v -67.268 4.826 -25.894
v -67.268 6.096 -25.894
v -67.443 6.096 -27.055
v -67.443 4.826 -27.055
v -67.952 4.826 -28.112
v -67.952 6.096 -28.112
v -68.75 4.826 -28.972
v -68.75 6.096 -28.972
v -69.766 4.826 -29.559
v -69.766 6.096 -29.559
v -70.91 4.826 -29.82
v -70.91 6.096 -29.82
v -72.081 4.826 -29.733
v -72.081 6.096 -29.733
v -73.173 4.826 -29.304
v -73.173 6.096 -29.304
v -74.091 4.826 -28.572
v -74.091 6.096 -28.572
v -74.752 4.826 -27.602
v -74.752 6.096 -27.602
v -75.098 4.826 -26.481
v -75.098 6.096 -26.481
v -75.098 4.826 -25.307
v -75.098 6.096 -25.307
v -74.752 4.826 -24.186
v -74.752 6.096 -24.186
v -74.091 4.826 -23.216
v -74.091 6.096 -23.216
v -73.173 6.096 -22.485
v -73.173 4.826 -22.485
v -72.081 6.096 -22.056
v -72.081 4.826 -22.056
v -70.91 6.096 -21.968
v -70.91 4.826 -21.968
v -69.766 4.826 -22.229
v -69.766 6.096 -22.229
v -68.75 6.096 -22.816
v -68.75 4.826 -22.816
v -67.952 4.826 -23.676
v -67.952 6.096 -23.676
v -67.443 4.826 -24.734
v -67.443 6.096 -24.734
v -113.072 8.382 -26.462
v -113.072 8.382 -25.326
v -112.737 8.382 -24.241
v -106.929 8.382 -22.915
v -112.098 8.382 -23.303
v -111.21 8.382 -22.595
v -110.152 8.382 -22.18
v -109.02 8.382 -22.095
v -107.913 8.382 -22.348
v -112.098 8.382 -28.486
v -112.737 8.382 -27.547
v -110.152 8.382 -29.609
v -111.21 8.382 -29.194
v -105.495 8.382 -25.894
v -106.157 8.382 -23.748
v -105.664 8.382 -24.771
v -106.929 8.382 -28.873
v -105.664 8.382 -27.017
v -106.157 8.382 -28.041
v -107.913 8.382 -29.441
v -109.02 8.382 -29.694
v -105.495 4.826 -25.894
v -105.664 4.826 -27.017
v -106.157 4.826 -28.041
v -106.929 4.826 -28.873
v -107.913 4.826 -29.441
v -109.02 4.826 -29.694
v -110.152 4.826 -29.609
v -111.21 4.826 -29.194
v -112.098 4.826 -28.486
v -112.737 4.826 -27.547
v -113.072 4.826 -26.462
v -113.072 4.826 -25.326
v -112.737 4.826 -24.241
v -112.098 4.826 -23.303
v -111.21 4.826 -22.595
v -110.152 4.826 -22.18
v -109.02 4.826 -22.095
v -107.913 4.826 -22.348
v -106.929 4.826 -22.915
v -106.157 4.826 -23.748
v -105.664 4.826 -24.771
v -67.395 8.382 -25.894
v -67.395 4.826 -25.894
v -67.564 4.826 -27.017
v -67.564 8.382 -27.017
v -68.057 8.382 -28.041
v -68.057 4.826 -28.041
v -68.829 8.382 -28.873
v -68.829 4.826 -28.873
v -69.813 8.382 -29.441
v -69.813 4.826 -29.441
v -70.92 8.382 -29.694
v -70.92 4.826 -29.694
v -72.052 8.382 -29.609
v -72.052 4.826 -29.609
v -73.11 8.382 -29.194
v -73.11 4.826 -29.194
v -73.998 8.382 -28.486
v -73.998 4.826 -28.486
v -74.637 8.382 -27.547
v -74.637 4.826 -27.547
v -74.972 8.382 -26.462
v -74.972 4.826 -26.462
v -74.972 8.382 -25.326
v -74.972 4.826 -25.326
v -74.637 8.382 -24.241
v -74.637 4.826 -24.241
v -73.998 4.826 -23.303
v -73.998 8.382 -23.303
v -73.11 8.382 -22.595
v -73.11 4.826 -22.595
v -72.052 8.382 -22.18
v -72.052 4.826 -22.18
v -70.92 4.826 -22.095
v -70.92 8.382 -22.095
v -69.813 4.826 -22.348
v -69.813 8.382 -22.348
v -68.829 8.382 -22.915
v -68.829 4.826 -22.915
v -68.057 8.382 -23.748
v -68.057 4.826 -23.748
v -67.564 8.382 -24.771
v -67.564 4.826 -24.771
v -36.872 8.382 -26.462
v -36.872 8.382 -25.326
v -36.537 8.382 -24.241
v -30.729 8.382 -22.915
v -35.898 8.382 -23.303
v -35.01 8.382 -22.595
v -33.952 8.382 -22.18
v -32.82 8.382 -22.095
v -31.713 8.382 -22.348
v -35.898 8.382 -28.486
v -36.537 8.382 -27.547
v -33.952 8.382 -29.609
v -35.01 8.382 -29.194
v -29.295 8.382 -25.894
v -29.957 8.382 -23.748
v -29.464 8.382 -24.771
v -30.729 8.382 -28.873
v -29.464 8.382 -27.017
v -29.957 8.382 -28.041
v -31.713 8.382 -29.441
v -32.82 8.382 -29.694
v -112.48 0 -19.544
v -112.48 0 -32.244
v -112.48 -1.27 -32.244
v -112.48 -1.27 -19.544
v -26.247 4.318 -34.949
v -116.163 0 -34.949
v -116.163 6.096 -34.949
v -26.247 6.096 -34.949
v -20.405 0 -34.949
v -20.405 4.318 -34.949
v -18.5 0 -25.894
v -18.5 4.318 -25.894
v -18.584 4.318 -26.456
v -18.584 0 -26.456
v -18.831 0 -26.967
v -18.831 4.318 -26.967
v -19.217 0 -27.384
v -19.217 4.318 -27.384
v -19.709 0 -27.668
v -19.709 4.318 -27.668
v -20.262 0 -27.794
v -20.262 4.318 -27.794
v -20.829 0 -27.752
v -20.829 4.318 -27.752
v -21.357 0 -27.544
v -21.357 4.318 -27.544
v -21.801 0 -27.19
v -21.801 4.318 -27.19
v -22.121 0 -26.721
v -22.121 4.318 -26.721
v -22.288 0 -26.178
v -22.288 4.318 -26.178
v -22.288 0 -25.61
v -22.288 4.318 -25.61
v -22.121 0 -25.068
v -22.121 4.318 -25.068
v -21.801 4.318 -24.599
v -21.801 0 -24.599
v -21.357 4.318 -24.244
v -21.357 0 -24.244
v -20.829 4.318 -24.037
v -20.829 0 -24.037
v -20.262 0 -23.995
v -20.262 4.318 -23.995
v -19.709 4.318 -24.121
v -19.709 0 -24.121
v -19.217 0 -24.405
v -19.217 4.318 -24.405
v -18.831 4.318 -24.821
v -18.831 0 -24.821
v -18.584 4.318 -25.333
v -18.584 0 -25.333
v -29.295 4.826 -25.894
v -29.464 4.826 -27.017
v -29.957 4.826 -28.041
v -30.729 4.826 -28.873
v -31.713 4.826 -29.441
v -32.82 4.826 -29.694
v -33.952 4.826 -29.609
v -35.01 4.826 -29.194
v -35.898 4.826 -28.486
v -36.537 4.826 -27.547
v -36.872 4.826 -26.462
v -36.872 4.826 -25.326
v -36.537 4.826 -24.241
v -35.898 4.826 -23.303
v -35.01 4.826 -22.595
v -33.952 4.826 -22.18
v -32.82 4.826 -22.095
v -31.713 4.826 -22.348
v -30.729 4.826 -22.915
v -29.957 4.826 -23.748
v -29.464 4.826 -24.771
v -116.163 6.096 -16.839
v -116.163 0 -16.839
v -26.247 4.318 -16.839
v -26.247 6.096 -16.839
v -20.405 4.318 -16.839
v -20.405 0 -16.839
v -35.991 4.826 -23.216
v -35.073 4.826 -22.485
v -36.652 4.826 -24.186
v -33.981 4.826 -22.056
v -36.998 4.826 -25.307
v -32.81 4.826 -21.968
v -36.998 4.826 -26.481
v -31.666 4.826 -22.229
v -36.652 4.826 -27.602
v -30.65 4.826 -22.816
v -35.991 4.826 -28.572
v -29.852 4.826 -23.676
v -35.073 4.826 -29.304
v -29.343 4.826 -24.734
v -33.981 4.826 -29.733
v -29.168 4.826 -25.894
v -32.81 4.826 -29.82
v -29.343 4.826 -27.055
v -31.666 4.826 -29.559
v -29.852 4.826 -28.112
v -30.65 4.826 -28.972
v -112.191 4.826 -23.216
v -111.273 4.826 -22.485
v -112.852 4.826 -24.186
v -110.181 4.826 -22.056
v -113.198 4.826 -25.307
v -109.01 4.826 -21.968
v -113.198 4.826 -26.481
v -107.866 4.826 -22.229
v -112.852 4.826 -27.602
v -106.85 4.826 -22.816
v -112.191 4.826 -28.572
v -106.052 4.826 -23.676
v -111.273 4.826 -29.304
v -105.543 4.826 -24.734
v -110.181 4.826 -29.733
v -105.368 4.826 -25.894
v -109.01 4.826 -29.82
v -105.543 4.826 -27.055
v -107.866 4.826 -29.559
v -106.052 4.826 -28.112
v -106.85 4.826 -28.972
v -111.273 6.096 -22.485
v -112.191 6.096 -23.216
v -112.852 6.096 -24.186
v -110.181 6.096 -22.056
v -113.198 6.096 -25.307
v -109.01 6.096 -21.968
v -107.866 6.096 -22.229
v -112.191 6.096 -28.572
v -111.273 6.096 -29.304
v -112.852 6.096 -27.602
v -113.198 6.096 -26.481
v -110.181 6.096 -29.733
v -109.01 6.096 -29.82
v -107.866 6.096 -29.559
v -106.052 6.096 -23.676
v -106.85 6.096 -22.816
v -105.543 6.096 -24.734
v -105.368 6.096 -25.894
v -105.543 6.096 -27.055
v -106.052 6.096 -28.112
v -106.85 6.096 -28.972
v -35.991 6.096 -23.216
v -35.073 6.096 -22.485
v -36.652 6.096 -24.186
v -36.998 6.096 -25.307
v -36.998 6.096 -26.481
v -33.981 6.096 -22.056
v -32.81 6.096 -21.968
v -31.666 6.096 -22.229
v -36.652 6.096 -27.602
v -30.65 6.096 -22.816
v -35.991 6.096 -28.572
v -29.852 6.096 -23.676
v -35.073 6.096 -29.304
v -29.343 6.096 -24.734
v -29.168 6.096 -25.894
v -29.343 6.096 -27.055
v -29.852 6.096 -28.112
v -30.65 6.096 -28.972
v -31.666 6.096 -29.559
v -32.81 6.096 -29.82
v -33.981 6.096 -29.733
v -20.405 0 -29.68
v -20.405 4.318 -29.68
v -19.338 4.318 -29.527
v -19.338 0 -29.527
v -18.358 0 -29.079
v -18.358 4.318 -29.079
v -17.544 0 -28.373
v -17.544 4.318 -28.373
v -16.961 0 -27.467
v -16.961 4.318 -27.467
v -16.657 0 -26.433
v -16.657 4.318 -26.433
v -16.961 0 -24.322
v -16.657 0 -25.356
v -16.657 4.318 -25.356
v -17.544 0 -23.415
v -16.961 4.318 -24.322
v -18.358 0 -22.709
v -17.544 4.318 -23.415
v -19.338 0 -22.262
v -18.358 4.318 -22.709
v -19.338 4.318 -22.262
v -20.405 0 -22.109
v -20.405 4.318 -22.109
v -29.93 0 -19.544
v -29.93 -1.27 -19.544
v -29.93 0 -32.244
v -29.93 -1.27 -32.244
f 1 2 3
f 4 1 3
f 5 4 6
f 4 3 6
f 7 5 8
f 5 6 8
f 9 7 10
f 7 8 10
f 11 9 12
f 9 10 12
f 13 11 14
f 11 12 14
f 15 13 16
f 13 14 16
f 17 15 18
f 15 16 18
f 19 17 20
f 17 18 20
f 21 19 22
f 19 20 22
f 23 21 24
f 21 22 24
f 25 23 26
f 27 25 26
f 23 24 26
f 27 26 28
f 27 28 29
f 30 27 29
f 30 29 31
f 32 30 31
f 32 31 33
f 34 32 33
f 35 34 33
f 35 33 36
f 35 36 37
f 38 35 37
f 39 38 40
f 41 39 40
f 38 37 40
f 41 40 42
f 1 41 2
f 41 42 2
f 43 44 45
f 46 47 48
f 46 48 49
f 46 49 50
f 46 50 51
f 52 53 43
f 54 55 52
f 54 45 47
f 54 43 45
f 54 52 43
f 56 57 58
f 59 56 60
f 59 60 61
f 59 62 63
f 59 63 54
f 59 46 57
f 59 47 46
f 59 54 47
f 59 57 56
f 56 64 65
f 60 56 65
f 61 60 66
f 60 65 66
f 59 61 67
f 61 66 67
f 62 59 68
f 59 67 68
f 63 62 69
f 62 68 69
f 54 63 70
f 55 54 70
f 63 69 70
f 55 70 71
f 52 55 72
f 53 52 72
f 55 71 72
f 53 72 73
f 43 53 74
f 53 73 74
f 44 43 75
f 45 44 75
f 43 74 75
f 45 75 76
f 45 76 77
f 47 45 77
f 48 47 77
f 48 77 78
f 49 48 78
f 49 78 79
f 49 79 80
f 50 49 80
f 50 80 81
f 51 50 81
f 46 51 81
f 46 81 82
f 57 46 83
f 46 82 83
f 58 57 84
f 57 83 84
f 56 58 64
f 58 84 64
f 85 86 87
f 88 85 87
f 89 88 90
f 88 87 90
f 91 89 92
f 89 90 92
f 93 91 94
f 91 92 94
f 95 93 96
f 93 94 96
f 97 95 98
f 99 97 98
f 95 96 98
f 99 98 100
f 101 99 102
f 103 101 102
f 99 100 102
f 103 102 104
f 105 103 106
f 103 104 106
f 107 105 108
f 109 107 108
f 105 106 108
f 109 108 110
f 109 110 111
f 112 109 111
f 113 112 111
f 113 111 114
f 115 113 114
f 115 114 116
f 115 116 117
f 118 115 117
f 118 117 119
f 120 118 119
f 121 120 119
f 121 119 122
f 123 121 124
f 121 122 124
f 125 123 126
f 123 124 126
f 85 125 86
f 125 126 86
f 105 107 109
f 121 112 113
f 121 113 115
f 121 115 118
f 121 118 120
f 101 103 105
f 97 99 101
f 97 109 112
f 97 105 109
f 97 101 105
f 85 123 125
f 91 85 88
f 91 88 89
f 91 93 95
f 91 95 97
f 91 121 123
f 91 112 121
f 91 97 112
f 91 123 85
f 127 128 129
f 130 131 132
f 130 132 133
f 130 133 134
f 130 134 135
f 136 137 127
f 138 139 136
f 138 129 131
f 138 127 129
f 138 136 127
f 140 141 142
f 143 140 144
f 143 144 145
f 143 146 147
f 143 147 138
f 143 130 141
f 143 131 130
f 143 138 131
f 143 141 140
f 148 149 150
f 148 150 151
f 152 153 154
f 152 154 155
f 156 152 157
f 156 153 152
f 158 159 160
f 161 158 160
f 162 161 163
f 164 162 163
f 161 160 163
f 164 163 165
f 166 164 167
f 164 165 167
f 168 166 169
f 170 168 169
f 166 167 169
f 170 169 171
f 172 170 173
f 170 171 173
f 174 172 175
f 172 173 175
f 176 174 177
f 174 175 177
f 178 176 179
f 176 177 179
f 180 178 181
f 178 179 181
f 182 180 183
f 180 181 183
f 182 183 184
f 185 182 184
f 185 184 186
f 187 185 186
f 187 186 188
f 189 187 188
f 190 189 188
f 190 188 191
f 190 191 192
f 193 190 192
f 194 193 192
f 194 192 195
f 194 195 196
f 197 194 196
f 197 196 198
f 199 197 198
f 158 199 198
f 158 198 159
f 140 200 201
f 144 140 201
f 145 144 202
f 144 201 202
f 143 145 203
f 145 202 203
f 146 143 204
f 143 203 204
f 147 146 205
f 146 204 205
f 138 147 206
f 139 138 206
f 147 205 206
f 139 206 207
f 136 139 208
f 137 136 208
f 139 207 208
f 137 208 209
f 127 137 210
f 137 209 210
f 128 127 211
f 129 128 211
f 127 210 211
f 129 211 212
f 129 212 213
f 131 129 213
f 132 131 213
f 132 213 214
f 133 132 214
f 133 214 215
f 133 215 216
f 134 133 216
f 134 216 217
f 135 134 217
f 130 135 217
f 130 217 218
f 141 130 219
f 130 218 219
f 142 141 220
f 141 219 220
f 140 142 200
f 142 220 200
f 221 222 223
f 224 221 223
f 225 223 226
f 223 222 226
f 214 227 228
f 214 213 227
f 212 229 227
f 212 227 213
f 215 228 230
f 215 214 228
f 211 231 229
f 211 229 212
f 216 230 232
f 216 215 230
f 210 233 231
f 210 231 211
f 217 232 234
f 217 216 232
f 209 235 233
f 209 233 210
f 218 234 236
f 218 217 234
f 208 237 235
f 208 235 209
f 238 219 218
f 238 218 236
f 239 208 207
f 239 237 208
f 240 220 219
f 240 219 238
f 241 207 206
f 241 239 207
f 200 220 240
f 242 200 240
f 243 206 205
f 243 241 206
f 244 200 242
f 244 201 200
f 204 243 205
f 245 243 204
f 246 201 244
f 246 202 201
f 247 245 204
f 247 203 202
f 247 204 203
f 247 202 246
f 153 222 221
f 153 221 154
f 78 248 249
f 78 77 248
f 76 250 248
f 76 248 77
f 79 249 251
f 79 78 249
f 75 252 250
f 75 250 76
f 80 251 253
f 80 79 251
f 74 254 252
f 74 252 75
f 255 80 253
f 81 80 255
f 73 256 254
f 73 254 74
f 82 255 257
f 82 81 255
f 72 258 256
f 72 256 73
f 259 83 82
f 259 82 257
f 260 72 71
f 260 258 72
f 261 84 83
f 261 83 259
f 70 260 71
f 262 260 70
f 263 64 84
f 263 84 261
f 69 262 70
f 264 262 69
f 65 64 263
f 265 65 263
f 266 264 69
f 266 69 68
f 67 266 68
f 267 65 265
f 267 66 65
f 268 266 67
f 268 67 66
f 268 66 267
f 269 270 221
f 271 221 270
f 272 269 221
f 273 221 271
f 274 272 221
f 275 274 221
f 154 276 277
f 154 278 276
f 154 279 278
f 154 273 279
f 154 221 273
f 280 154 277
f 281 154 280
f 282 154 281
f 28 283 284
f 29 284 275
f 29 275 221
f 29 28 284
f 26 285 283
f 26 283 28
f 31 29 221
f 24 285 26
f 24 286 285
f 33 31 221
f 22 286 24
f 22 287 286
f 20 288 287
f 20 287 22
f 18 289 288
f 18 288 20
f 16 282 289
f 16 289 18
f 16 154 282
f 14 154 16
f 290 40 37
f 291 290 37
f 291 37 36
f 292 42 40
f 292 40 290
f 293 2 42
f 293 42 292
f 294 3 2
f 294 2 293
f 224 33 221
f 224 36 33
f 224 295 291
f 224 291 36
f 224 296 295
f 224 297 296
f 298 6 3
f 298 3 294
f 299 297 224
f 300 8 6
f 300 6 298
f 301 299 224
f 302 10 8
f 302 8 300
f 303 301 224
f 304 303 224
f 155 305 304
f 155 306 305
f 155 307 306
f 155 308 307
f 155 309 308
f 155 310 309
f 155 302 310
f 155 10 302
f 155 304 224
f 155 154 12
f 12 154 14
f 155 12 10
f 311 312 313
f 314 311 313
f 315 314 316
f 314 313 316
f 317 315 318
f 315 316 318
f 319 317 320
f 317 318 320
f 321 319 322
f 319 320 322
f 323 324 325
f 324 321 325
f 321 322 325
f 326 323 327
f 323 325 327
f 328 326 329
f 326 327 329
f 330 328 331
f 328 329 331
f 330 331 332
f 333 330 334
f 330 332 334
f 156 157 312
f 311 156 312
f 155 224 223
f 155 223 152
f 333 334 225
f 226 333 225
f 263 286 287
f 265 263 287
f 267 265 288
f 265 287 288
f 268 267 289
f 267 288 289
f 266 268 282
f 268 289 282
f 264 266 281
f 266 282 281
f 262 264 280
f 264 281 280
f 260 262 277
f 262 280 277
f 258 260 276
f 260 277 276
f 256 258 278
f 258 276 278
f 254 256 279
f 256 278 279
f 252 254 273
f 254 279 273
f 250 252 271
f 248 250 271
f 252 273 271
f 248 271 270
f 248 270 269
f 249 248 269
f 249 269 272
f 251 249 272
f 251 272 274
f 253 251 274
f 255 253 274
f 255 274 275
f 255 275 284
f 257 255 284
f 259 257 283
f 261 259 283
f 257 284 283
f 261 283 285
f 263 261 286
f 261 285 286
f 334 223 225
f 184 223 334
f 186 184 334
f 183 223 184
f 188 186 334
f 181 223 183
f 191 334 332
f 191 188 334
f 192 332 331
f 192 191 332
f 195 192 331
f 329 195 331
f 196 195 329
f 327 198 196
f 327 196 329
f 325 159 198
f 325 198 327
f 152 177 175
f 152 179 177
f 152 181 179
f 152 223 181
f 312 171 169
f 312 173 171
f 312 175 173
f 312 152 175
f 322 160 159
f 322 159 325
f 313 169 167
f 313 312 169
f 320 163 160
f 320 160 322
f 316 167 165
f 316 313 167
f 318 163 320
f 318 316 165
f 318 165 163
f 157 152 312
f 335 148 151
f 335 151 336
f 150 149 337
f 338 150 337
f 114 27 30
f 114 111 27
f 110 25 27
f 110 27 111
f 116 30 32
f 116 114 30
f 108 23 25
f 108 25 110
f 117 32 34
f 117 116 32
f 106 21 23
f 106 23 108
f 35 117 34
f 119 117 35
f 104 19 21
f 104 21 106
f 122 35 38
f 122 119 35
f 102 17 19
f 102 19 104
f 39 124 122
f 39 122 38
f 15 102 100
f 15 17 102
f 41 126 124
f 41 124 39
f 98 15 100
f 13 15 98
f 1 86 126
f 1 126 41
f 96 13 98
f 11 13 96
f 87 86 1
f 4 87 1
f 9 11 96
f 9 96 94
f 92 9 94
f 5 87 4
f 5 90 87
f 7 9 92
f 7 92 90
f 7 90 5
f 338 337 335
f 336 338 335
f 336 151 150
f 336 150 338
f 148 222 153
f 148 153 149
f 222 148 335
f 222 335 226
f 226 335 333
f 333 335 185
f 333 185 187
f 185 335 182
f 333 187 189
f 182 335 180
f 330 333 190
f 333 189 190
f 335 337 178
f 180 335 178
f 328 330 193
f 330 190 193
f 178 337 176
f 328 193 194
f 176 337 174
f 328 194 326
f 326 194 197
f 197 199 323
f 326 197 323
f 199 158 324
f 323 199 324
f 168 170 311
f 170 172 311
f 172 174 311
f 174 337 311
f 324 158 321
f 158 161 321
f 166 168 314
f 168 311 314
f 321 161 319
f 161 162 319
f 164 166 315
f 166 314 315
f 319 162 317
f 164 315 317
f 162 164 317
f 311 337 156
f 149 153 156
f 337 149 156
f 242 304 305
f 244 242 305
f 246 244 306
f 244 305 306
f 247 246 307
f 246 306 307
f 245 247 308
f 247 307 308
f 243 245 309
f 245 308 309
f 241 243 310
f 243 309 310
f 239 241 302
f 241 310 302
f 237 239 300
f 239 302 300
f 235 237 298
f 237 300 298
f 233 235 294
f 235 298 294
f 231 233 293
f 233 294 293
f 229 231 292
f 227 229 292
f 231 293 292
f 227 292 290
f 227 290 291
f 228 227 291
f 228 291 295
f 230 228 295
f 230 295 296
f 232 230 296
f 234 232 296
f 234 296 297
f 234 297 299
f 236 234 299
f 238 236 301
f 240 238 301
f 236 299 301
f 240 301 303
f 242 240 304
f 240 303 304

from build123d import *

# Parameters (mm, degrees)
SKETCH1_W           = 99.568
SKETCH1_H           = 18.1102
BOSS_EXTRUDE1_DEPTH = 6.096
SKETCH2_W           = 9.652
SKETCH2_H           = 18.1102
CUT_EXTRUDE1_DEPTH  = 1.778
SKETCH3_R           = 1.905
CUT_EXTRUDE2_DEPTH  = 5.318
SKETCH4_R           = 3.937
CUT_EXTRUDE3_DEPTH  = 1.27
SKETCH5_W           = 82.55
SKETCH5_H           = 12.7
BOSS_EXTRUDE2_DEPTH = 1.27
CUT_EXTRUDE4_DEPTH  = 6.588
SKETCH8_R           = 3.81
BOSS_EXTRUDE3_DEPTH = 3.556


with BuildPart() as part:
    # Sketch1 → Boss-Extrude1 (new body)
    with BuildSketch(Plane(origin=(0, 0, 0), x_dir=(1, 0, 0), z_dir=(0, 1, 0))):
        with Locations((-66.378666667, 25.894273737)):
            Rectangle(SKETCH1_W, SKETCH1_H)
    extrude(amount=BOSS_EXTRUDE1_DEPTH)

    # Sketch2 → Cut-Extrude1 (cut)
    with BuildSketch(Plane(origin=(0, 6.096, 0), x_dir=(1, 0, 0), z_dir=(0, 1, 0))):
        with Locations((-21.420666667, 25.894273737)):
            Rectangle(SKETCH2_W, SKETCH2_H)
    extrude(amount=-CUT_EXTRUDE1_DEPTH, mode=Mode.SUBTRACT)

    # Sketch3 → Cut-Extrude2 (cut, through all)
    with BuildSketch(Plane(origin=(0, 4.318, 0), x_dir=(1, 0, 0), z_dir=(0, 1, 0))):
        with Locations((-20.404666667, 25.894273737)):
            Circle(SKETCH3_R)
    extrude(amount=-CUT_EXTRUDE2_DEPTH, mode=Mode.SUBTRACT)

    # Sketch4 → Cut-Extrude3 (cut)
    with BuildSketch(Plane(origin=(0, 6.096, 0), x_dir=(1, 0, 0), z_dir=(0, 1, 0))):
        with Locations((-33.104666667, 25.894273737)):
            Circle(SKETCH4_R)
        with Locations((-71.204666667, 25.894273737)):
            Circle(SKETCH4_R)
        with Locations((-109.304666667, 25.894273737)):
            Circle(SKETCH4_R)
    extrude(amount=-CUT_EXTRUDE3_DEPTH, mode=Mode.SUBTRACT)

    # Sketch5 → Boss-Extrude2 (add)
    with BuildSketch(Plane.XZ):
        with Locations((-71.204666667, -25.894273737)):
            Rectangle(SKETCH5_W, SKETCH5_H)
    extrude(amount=BOSS_EXTRUDE2_DEPTH)

    # Sketch7 → Cut-Extrude4 (cut, through all)
    with BuildSketch(Plane(origin=(0, 4.318, 0), x_dir=(1, 0, 0), z_dir=(0, 1, 0))):
        with BuildLine():
            Line((-16.594666667, 34.949373737), (-20.404666667, 34.949373737))
            Line((-20.404666667, 34.949373737), (-20.404666667, 29.680045052))
            ThreePointArc((-20.404666667, 29.680045052), (-16.618895352, 25.894273737), (-20.404666667, 22.108502422))
            Line((-20.404666667, 22.108502422), (-20.404666667, 16.839173737))
            Line((-20.404666667, 16.839173737), (-16.594666667, 16.839173737))
            Line((-16.594666667, 16.839173737), (-16.594666667, 34.949373737))
        make_face()
    extrude(amount=-CUT_EXTRUDE4_DEPTH, mode=Mode.SUBTRACT)

    # Sketch8 → Boss-Extrude3 (add)
    with BuildSketch(Plane(origin=(0, 4.826, 0), x_dir=(1, 0, 0), z_dir=(0, 1, 0))):
        with Locations((-33.104666667, 25.894273737)):
            Circle(SKETCH8_R)
        with Locations((-71.204666667, 25.894273737)):
            Circle(SKETCH8_R)
        with Locations((-109.304666667, 25.894273737)):
            Circle(SKETCH8_R)
    extrude(amount=BOSS_EXTRUDE3_DEPTH)


solid = part.part
